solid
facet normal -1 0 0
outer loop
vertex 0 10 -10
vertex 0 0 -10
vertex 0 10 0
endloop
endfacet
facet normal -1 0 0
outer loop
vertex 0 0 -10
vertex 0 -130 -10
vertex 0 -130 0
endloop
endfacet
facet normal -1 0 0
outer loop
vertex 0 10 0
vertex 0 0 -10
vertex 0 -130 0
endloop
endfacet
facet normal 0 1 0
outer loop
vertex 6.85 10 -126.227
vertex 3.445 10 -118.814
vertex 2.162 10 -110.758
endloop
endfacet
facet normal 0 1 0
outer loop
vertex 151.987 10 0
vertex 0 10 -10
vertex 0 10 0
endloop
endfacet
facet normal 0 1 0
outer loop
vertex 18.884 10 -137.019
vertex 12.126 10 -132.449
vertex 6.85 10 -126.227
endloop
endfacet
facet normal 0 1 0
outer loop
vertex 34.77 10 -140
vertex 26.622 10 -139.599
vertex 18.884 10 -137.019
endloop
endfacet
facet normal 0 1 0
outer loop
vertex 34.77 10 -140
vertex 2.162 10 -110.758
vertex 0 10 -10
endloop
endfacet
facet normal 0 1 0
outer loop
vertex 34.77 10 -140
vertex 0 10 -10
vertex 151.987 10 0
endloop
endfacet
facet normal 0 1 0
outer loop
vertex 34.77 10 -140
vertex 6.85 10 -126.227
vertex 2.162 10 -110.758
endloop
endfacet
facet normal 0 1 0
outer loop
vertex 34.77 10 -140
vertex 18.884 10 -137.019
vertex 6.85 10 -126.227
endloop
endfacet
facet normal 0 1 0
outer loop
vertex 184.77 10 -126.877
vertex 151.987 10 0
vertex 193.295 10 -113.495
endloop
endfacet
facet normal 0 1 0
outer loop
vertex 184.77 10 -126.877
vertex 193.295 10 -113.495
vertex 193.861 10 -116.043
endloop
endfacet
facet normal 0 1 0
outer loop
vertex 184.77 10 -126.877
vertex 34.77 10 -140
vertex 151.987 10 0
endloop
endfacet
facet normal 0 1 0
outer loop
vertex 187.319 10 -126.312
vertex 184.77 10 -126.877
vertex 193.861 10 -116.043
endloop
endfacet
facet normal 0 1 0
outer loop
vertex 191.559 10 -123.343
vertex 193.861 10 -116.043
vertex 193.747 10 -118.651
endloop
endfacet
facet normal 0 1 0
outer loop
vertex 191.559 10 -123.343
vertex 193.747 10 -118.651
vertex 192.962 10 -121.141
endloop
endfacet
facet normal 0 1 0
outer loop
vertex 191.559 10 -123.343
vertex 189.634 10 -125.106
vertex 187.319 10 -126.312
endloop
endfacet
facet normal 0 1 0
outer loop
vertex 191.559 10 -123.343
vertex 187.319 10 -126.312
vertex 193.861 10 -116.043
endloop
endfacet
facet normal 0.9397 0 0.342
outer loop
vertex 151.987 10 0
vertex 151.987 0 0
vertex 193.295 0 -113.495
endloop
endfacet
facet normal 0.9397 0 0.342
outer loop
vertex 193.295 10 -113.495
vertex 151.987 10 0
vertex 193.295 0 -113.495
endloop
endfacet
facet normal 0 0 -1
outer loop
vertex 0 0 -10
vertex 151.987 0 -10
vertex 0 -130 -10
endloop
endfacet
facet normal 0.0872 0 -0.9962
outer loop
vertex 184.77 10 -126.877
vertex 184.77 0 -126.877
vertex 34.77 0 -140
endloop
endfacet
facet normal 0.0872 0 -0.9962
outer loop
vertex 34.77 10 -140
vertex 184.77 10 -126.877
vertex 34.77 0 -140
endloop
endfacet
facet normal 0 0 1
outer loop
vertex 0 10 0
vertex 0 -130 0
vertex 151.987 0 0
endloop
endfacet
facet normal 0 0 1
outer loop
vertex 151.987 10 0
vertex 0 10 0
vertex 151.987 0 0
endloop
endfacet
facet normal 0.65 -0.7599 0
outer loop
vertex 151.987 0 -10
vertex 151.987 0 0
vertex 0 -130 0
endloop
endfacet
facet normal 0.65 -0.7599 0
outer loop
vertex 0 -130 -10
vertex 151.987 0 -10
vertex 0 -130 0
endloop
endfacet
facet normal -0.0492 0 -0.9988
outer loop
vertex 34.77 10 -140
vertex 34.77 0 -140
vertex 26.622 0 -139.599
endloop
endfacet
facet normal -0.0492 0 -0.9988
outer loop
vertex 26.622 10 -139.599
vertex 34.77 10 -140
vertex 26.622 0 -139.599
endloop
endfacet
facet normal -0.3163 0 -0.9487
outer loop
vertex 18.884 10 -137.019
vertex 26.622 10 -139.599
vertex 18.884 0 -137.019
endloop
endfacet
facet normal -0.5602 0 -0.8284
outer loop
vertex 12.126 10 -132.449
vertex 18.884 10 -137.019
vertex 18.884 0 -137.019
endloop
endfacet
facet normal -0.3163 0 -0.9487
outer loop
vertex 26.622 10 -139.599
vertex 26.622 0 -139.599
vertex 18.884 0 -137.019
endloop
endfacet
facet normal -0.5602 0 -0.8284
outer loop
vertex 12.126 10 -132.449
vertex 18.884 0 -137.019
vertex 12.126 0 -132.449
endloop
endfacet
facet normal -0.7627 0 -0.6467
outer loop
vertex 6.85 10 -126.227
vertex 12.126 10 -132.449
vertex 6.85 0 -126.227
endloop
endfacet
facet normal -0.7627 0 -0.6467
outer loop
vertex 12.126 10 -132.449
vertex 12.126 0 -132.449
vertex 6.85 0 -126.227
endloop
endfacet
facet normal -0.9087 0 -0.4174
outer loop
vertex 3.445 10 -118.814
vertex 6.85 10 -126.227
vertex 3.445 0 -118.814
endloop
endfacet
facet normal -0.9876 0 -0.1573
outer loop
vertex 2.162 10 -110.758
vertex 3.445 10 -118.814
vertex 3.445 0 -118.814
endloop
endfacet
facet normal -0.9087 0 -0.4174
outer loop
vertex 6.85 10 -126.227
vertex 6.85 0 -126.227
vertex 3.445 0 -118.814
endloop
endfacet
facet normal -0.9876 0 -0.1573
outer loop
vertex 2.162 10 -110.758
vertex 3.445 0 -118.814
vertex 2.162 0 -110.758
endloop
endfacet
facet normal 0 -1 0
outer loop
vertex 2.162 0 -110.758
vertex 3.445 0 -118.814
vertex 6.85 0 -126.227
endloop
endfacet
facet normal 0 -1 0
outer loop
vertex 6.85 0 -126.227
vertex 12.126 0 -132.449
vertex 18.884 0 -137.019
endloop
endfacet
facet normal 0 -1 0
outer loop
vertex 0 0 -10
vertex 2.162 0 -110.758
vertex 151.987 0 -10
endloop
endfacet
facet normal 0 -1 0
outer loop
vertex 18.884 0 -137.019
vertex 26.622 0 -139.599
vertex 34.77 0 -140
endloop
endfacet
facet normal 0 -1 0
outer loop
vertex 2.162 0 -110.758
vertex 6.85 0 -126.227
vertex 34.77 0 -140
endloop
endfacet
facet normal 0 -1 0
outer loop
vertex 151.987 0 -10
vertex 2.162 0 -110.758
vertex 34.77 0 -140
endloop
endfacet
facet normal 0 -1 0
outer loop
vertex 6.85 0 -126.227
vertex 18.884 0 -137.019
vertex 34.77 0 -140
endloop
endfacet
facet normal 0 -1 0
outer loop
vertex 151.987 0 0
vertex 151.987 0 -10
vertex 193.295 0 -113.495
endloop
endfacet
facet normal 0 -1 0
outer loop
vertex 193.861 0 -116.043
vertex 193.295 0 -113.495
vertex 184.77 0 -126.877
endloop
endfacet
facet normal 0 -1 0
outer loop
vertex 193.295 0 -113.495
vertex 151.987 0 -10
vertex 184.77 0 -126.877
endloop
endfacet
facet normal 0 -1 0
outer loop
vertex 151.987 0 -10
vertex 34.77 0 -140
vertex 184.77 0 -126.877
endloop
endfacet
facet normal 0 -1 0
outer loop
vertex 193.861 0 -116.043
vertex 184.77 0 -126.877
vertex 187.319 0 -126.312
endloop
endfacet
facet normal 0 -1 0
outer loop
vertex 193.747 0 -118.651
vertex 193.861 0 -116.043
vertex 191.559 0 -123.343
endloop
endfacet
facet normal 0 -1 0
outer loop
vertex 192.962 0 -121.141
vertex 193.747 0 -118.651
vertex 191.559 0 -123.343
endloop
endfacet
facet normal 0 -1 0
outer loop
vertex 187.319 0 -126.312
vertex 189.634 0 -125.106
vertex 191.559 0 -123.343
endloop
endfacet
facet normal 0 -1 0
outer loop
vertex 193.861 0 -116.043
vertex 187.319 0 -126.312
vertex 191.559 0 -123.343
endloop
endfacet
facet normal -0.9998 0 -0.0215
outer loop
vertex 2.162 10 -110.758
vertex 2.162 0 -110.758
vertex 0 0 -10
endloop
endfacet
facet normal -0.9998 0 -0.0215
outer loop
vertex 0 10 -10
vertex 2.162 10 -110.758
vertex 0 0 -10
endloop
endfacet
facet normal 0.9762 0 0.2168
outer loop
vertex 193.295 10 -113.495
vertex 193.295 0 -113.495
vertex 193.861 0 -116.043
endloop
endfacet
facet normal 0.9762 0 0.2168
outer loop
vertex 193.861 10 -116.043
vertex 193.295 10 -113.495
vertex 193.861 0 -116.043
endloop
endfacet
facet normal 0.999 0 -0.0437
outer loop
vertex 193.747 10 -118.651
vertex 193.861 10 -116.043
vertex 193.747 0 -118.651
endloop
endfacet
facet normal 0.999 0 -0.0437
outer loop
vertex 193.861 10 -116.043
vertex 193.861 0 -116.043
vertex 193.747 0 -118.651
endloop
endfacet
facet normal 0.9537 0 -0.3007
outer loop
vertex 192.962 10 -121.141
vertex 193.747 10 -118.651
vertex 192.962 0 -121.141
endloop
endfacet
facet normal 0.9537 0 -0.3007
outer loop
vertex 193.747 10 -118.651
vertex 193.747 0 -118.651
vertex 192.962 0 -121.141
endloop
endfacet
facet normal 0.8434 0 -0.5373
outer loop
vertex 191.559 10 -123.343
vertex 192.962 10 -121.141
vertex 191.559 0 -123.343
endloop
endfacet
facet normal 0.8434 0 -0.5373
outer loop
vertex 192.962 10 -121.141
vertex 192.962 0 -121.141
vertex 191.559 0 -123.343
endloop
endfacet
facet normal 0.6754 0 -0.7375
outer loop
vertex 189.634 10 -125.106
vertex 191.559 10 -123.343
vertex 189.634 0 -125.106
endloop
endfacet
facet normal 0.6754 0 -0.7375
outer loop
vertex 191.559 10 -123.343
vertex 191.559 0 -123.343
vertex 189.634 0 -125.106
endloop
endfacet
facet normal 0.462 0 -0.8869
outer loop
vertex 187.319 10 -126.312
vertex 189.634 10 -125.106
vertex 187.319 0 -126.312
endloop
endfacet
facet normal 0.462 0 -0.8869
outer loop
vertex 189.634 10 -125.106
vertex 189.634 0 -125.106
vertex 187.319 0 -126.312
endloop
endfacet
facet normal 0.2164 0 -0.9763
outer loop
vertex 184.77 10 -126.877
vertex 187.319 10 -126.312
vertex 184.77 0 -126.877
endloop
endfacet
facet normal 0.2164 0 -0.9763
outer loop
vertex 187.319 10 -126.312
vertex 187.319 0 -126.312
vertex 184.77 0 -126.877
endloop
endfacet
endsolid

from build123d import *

# Parameters (mm, degrees)
BOSS_EXTRUDE3_DEPTH = 10
BOSS_EXTRUDE4_DEPTH = 10


with BuildPart() as part:
    # Sketch3 → Boss-Extrude3 (new body)
    with BuildSketch(Plane.XY):
        Polygon((0, 0), (151.986841536, 0), (0, -130), align=None)
    extrude(amount=-BOSS_EXTRUDE3_DEPTH)

    # Sketch5 → Boss-Extrude4 (add)
    with BuildSketch(Plane(origin=(0, 0, 0), x_dir=(1, 0, 0), z_dir=(0, 1, 0))):
        with BuildLine():
            Line((0, 0), (151.986841536, 0))
            Line((151.986841536, 0), (193.295480236, 113.494552057))
            ThreePointArc((193.295480236, 113.494552057), (192.332468486, 122.287749574), (184.770111455, 126.876700471))
            Line((184.770111455, 126.876700471), (34.770111455, 140))
            ThreePointArc((34.770111455, 140), (12.126197015, 132.448649393), (2.162345286, 110.757835303))
            Line((2.162345286, 110.757835303), (0, 10))
            Line((0, 10), (0, 0))
        make_face()
    extrude(amount=BOSS_EXTRUDE4_DEPTH)


solid = part.part
